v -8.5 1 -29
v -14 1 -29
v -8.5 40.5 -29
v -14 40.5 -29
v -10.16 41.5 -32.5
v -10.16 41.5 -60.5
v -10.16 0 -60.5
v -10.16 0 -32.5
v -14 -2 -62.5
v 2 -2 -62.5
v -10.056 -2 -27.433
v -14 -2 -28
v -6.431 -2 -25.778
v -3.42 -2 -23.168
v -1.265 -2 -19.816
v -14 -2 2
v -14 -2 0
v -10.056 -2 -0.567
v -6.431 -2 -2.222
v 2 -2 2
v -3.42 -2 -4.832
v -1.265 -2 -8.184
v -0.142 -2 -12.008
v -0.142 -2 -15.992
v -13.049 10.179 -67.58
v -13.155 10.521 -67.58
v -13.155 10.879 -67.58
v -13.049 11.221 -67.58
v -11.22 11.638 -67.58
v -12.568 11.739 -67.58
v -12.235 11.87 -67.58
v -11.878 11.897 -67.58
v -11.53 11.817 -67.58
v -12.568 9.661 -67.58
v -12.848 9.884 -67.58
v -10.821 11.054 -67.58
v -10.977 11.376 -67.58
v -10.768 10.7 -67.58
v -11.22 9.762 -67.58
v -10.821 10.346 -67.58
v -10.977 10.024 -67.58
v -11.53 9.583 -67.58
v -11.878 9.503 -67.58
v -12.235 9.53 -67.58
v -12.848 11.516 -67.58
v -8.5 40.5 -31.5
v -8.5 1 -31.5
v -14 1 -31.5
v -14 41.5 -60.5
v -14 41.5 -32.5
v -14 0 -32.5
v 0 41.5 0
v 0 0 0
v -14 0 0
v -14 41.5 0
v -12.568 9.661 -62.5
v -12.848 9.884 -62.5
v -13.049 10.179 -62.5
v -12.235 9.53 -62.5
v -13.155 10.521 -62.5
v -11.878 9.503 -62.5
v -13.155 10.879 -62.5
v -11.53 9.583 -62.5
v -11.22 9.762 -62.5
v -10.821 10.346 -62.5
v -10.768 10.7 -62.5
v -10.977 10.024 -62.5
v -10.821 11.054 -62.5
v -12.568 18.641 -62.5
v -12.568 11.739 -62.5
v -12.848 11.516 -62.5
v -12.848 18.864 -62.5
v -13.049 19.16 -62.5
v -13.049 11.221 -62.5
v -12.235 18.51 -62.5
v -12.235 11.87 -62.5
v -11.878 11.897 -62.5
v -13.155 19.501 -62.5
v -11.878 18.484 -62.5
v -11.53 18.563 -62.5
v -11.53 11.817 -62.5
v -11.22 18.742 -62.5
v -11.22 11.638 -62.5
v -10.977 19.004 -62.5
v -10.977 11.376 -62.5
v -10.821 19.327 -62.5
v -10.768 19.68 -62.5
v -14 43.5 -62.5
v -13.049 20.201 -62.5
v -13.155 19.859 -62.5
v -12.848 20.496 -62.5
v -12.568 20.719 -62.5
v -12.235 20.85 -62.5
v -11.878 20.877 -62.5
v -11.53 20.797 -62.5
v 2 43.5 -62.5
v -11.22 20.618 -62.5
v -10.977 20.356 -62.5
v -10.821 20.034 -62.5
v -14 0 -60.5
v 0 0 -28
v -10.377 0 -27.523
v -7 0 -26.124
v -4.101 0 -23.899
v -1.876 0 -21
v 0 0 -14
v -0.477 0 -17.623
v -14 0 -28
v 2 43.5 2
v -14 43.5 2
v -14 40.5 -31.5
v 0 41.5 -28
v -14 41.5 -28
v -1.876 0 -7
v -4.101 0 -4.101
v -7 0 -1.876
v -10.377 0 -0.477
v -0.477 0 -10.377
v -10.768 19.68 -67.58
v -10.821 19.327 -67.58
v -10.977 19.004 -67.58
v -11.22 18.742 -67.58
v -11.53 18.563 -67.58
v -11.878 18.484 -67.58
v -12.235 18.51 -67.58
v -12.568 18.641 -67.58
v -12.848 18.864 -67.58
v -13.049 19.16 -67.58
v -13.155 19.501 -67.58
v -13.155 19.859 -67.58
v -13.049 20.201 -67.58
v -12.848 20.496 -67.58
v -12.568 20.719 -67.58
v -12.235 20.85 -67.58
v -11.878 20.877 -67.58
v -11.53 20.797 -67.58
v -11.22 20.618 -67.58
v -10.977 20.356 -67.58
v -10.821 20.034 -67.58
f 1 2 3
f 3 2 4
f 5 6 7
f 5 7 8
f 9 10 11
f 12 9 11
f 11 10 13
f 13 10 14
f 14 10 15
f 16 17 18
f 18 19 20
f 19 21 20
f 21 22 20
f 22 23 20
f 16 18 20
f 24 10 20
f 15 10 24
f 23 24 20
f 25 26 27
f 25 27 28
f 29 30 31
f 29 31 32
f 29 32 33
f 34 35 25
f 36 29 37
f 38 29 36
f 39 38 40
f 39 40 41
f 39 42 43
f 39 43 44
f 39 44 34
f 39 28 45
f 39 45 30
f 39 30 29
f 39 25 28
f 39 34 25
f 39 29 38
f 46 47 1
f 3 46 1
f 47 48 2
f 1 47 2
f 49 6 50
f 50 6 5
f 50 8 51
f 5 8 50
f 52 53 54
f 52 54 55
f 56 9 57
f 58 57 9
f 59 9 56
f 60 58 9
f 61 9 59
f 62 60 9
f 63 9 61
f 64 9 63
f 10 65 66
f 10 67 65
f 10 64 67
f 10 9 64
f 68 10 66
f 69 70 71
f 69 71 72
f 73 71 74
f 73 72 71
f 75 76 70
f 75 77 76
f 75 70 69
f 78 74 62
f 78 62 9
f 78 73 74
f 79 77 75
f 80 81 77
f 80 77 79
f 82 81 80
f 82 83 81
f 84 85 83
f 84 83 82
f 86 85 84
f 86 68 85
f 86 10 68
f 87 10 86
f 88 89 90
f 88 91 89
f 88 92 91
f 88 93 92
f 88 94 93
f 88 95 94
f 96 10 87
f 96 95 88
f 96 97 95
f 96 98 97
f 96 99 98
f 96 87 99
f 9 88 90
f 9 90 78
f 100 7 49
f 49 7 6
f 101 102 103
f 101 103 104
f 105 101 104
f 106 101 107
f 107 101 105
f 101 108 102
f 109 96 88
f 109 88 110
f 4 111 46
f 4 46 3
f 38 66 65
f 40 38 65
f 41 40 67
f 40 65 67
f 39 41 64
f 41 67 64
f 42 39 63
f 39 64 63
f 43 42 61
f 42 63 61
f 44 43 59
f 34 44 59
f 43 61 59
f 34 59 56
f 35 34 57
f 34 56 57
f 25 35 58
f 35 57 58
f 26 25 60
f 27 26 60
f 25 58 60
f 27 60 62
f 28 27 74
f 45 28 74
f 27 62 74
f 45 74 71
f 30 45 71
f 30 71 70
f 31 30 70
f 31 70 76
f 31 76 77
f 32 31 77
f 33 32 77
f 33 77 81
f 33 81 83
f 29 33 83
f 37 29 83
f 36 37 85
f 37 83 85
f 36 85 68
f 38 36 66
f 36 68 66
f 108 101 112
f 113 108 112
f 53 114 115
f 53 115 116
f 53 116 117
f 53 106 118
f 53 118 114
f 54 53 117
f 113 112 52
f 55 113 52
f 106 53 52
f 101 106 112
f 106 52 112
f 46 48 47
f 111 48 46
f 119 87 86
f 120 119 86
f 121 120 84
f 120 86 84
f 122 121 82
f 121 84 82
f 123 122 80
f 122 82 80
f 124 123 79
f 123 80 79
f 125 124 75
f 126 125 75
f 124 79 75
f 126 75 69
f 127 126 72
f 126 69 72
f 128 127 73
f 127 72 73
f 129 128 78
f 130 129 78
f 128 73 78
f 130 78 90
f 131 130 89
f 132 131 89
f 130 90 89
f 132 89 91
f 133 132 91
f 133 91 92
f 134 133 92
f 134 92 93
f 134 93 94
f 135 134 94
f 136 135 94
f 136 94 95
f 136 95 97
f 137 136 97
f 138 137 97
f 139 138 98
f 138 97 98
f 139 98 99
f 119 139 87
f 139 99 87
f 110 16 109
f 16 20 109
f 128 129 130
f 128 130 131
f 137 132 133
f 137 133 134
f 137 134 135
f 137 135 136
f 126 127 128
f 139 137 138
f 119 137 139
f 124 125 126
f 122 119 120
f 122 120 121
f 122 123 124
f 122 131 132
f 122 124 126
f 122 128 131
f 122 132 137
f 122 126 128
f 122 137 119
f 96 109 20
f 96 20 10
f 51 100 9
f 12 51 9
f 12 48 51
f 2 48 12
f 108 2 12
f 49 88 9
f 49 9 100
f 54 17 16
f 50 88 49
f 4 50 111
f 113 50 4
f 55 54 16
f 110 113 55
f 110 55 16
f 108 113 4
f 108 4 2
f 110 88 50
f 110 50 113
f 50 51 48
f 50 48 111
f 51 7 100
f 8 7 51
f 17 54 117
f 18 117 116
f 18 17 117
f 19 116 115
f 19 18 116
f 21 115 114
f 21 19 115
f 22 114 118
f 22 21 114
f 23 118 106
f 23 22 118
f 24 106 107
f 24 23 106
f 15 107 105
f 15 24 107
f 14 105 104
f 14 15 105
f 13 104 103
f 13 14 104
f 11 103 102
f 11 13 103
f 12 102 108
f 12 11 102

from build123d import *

# Parameters (mm, degrees)
SKETCH1_W           = 64.5
SKETCH1_H           = 45.5
BOSS_EXTRUDE1_DEPTH = 2
SKETCH2_W           = 64.5
SKETCH2_H           = 45.5
SKETCH2_W_2         = 28
SKETCH2_H_2         = 41.5
BOSS_EXTRUDE2_DEPTH = 14
CUT_EXTRUDE1_REACH  = 80.565
SKETCH3_R           = 14
SKETCH4_W           = 2.5
SKETCH4_H           = 39.5
CUT_EXTRUDE2_DEPTH  = 5.5
SKETCH5_W           = 28
SKETCH5_H           = 41.5
BOSS_EXTRUDE3_DEPTH = 10.16
SKETCH6_R           = 1.2
BOSS_EXTRUDE4_DEPTH = 5.08


with BuildPart() as part:
    # Sketch1 → Boss-Extrude1 (new body)
    with BuildSketch(Plane(origin=(0, 0, 0), x_dir=(0, 0, -1), z_dir=(1, 0, 0))):
        with Locations((30.25, 20.75)):
            Rectangle(SKETCH1_W, SKETCH1_H)
    extrude(amount=BOSS_EXTRUDE1_DEPTH)

    # Sketch2 → Boss-Extrude2 (add)
    with BuildSketch(Plane.ZY):
        with Locations((-30.25, 20.75)):
            Rectangle(SKETCH2_W, SKETCH2_H)
        with Locations((-46.5, 20.75)):
            Rectangle(SKETCH2_W_2, SKETCH2_H_2, mode=Mode.SUBTRACT)
        with Locations((-14, 20.75)):
            Rectangle(SKETCH2_W_2, SKETCH2_H_2, mode=Mode.SUBTRACT)
    extrude(amount=BOSS_EXTRUDE2_DEPTH)

    # Sketch3 → Cut-Extrude1 (cut, up to next)
    with BuildSketch(Plane(origin=(0, -2, 0), x_dir=(1, 0, 0), z_dir=(0, 1, 0)), mode=Mode.PRIVATE) as cut_extrude1_sk1:
        with Locations((-14, 14)):
            Circle(SKETCH3_R)
    cut_extrude1_tool1 = extrude(cut_extrude1_sk1.sketch, amount=CUT_EXTRUDE1_REACH, mode=Mode.PRIVATE) & part.part
    add(cut_extrude1_tool1.solids().sort_by_distance((-14, -2, -14))[0], mode=Mode.SUBTRACT)

    # Sketch4 → Cut-Extrude2 (cut)
    with BuildSketch(Plane.ZY.offset(14)):
        with Locations((-30.25, 20.75)):
            Rectangle(SKETCH4_W, SKETCH4_H)
    extrude(amount=-CUT_EXTRUDE2_DEPTH, mode=Mode.SUBTRACT)

    # Sketch5 → Boss-Extrude3 (add)
    with BuildSketch(Plane.ZY):
        with Locations((-46.5, 20.75)):
            Rectangle(SKETCH5_W, SKETCH5_H)
    extrude(amount=BOSS_EXTRUDE3_DEPTH)

    # Sketch6 → Boss-Extrude4 (add)
    with BuildSketch(Plane(origin=(0, 0, -62.5), x_dir=(-1, 0, 0), z_dir=(0, 0, -1))):
        with Locations(Location((11.968, 10.7, 0), (0, 0, 180))):
            Circle(SKETCH6_R)
        with Locations(Location((11.968, 19.68025612, 0), (0, 0, 180))):
            Circle(SKETCH6_R)
    extrude(amount=BOSS_EXTRUDE4_DEPTH)


solid = part.part
